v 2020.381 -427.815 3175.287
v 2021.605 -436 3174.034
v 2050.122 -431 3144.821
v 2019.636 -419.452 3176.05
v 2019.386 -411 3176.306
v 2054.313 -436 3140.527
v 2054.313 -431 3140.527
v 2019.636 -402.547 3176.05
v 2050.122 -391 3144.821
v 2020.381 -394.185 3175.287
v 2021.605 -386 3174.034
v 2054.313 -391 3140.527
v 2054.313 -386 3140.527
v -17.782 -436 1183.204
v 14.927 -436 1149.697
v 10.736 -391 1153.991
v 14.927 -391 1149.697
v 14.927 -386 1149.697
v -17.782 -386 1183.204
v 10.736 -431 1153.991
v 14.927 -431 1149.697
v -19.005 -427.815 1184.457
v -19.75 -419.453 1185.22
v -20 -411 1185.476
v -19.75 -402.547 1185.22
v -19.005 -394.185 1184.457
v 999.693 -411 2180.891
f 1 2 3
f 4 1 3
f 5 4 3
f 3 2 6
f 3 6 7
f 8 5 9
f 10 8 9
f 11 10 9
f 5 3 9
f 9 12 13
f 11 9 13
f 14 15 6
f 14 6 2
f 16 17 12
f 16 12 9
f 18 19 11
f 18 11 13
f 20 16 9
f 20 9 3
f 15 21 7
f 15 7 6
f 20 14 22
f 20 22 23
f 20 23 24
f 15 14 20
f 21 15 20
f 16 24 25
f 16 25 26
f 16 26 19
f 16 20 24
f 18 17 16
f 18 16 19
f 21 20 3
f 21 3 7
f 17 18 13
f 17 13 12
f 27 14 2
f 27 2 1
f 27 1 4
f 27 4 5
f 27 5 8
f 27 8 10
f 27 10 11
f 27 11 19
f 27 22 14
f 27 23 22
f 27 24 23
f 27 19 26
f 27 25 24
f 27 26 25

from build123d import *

# Parameters (mm, degrees)
EXTRUDE001_DEPTH           = 2850
EXTRUDE001_ROLL_ANGLE      = -179.999992
EXTRUDE001_PITCH_ANGLE     = -45.690277
EXTRUDE001_PLACEMENT_ANGLE = 179.999997


with BuildPart() as part:
    # Wire → Extrude001 (new body)
    with BuildSketch(Plane(origin=(-451.161164, -905.45842, 0), x_dir=(0, 1, 0), z_dir=(0, 0, 1))):
        with BuildLine():
            add(Edge.make_bspline(
                [(25, -21.225616), (25, 25.598967)],
                knots=[0, 0, 468.245837, 468.245837], degree=1))
            add(Edge.make_bspline(
                [(25, 25.598967), (20, 25.598967)],
                knots=[0, 0, 50, 50], degree=1))
            add(Edge.make_bspline(
                [(20, 25.598967), (20, 19.598967)],
                knots=[0, 0, 60, 60], degree=1))
            add(Edge.make_bspline(
                [(20, 19.598967), (-20, 19.598967)],
                knots=[0, 0, 400, 400], degree=1))
            add(Edge.make_bspline(
                [(-20, 19.598967), (-20, 25.598967)],
                knots=[0, 0, 60, 60], degree=1))
            add(Edge.make_bspline(
                [(-20, 25.598967), (-25, 25.598967)],
                knots=[0, 0, 50, 50], degree=1))
            add(Edge.make_bspline(
                [(-25, 25.598967), (-25, -21.225616)],
                knots=[0, 0, 468.245837, 468.245837], degree=1))
            add(Edge.make_bspline(
                [(-25, -21.225616), (0, -27.680588), (25, -21.225616)],
                knots=[1.318116, 1.318116, 1.318116, 1.823477, 1.823477, 1.823477], degree=2, weights=[1, 0.968246, 1]))
        make_face()
    extrude(amount=-EXTRUDE001_DEPTH)


with BuildPart() as part_1:
    # Extrude001 roll: moved
    add(part.part.rotate(Axis((0, 0, 0), (1, 0, 0)), EXTRUDE001_ROLL_ANGLE))


with BuildPart() as part_2:
    # Extrude001 pitch: moved
    add(part_1.part.rotate(Axis((0, 0, 0), (0, 1, 0)), EXTRUDE001_PITCH_ANGLE))


with BuildPart() as part_3:
    # Extrude001 placement: moved
    add(part_2.part.moved(Location((-318.107664, 494.458438, 1490.854639))).rotate(Axis((-318.107664, 494.458438, 1490.854639), (0, 0, 1)), EXTRUDE001_PLACEMENT_ANGLE))


solid = part_3.part
